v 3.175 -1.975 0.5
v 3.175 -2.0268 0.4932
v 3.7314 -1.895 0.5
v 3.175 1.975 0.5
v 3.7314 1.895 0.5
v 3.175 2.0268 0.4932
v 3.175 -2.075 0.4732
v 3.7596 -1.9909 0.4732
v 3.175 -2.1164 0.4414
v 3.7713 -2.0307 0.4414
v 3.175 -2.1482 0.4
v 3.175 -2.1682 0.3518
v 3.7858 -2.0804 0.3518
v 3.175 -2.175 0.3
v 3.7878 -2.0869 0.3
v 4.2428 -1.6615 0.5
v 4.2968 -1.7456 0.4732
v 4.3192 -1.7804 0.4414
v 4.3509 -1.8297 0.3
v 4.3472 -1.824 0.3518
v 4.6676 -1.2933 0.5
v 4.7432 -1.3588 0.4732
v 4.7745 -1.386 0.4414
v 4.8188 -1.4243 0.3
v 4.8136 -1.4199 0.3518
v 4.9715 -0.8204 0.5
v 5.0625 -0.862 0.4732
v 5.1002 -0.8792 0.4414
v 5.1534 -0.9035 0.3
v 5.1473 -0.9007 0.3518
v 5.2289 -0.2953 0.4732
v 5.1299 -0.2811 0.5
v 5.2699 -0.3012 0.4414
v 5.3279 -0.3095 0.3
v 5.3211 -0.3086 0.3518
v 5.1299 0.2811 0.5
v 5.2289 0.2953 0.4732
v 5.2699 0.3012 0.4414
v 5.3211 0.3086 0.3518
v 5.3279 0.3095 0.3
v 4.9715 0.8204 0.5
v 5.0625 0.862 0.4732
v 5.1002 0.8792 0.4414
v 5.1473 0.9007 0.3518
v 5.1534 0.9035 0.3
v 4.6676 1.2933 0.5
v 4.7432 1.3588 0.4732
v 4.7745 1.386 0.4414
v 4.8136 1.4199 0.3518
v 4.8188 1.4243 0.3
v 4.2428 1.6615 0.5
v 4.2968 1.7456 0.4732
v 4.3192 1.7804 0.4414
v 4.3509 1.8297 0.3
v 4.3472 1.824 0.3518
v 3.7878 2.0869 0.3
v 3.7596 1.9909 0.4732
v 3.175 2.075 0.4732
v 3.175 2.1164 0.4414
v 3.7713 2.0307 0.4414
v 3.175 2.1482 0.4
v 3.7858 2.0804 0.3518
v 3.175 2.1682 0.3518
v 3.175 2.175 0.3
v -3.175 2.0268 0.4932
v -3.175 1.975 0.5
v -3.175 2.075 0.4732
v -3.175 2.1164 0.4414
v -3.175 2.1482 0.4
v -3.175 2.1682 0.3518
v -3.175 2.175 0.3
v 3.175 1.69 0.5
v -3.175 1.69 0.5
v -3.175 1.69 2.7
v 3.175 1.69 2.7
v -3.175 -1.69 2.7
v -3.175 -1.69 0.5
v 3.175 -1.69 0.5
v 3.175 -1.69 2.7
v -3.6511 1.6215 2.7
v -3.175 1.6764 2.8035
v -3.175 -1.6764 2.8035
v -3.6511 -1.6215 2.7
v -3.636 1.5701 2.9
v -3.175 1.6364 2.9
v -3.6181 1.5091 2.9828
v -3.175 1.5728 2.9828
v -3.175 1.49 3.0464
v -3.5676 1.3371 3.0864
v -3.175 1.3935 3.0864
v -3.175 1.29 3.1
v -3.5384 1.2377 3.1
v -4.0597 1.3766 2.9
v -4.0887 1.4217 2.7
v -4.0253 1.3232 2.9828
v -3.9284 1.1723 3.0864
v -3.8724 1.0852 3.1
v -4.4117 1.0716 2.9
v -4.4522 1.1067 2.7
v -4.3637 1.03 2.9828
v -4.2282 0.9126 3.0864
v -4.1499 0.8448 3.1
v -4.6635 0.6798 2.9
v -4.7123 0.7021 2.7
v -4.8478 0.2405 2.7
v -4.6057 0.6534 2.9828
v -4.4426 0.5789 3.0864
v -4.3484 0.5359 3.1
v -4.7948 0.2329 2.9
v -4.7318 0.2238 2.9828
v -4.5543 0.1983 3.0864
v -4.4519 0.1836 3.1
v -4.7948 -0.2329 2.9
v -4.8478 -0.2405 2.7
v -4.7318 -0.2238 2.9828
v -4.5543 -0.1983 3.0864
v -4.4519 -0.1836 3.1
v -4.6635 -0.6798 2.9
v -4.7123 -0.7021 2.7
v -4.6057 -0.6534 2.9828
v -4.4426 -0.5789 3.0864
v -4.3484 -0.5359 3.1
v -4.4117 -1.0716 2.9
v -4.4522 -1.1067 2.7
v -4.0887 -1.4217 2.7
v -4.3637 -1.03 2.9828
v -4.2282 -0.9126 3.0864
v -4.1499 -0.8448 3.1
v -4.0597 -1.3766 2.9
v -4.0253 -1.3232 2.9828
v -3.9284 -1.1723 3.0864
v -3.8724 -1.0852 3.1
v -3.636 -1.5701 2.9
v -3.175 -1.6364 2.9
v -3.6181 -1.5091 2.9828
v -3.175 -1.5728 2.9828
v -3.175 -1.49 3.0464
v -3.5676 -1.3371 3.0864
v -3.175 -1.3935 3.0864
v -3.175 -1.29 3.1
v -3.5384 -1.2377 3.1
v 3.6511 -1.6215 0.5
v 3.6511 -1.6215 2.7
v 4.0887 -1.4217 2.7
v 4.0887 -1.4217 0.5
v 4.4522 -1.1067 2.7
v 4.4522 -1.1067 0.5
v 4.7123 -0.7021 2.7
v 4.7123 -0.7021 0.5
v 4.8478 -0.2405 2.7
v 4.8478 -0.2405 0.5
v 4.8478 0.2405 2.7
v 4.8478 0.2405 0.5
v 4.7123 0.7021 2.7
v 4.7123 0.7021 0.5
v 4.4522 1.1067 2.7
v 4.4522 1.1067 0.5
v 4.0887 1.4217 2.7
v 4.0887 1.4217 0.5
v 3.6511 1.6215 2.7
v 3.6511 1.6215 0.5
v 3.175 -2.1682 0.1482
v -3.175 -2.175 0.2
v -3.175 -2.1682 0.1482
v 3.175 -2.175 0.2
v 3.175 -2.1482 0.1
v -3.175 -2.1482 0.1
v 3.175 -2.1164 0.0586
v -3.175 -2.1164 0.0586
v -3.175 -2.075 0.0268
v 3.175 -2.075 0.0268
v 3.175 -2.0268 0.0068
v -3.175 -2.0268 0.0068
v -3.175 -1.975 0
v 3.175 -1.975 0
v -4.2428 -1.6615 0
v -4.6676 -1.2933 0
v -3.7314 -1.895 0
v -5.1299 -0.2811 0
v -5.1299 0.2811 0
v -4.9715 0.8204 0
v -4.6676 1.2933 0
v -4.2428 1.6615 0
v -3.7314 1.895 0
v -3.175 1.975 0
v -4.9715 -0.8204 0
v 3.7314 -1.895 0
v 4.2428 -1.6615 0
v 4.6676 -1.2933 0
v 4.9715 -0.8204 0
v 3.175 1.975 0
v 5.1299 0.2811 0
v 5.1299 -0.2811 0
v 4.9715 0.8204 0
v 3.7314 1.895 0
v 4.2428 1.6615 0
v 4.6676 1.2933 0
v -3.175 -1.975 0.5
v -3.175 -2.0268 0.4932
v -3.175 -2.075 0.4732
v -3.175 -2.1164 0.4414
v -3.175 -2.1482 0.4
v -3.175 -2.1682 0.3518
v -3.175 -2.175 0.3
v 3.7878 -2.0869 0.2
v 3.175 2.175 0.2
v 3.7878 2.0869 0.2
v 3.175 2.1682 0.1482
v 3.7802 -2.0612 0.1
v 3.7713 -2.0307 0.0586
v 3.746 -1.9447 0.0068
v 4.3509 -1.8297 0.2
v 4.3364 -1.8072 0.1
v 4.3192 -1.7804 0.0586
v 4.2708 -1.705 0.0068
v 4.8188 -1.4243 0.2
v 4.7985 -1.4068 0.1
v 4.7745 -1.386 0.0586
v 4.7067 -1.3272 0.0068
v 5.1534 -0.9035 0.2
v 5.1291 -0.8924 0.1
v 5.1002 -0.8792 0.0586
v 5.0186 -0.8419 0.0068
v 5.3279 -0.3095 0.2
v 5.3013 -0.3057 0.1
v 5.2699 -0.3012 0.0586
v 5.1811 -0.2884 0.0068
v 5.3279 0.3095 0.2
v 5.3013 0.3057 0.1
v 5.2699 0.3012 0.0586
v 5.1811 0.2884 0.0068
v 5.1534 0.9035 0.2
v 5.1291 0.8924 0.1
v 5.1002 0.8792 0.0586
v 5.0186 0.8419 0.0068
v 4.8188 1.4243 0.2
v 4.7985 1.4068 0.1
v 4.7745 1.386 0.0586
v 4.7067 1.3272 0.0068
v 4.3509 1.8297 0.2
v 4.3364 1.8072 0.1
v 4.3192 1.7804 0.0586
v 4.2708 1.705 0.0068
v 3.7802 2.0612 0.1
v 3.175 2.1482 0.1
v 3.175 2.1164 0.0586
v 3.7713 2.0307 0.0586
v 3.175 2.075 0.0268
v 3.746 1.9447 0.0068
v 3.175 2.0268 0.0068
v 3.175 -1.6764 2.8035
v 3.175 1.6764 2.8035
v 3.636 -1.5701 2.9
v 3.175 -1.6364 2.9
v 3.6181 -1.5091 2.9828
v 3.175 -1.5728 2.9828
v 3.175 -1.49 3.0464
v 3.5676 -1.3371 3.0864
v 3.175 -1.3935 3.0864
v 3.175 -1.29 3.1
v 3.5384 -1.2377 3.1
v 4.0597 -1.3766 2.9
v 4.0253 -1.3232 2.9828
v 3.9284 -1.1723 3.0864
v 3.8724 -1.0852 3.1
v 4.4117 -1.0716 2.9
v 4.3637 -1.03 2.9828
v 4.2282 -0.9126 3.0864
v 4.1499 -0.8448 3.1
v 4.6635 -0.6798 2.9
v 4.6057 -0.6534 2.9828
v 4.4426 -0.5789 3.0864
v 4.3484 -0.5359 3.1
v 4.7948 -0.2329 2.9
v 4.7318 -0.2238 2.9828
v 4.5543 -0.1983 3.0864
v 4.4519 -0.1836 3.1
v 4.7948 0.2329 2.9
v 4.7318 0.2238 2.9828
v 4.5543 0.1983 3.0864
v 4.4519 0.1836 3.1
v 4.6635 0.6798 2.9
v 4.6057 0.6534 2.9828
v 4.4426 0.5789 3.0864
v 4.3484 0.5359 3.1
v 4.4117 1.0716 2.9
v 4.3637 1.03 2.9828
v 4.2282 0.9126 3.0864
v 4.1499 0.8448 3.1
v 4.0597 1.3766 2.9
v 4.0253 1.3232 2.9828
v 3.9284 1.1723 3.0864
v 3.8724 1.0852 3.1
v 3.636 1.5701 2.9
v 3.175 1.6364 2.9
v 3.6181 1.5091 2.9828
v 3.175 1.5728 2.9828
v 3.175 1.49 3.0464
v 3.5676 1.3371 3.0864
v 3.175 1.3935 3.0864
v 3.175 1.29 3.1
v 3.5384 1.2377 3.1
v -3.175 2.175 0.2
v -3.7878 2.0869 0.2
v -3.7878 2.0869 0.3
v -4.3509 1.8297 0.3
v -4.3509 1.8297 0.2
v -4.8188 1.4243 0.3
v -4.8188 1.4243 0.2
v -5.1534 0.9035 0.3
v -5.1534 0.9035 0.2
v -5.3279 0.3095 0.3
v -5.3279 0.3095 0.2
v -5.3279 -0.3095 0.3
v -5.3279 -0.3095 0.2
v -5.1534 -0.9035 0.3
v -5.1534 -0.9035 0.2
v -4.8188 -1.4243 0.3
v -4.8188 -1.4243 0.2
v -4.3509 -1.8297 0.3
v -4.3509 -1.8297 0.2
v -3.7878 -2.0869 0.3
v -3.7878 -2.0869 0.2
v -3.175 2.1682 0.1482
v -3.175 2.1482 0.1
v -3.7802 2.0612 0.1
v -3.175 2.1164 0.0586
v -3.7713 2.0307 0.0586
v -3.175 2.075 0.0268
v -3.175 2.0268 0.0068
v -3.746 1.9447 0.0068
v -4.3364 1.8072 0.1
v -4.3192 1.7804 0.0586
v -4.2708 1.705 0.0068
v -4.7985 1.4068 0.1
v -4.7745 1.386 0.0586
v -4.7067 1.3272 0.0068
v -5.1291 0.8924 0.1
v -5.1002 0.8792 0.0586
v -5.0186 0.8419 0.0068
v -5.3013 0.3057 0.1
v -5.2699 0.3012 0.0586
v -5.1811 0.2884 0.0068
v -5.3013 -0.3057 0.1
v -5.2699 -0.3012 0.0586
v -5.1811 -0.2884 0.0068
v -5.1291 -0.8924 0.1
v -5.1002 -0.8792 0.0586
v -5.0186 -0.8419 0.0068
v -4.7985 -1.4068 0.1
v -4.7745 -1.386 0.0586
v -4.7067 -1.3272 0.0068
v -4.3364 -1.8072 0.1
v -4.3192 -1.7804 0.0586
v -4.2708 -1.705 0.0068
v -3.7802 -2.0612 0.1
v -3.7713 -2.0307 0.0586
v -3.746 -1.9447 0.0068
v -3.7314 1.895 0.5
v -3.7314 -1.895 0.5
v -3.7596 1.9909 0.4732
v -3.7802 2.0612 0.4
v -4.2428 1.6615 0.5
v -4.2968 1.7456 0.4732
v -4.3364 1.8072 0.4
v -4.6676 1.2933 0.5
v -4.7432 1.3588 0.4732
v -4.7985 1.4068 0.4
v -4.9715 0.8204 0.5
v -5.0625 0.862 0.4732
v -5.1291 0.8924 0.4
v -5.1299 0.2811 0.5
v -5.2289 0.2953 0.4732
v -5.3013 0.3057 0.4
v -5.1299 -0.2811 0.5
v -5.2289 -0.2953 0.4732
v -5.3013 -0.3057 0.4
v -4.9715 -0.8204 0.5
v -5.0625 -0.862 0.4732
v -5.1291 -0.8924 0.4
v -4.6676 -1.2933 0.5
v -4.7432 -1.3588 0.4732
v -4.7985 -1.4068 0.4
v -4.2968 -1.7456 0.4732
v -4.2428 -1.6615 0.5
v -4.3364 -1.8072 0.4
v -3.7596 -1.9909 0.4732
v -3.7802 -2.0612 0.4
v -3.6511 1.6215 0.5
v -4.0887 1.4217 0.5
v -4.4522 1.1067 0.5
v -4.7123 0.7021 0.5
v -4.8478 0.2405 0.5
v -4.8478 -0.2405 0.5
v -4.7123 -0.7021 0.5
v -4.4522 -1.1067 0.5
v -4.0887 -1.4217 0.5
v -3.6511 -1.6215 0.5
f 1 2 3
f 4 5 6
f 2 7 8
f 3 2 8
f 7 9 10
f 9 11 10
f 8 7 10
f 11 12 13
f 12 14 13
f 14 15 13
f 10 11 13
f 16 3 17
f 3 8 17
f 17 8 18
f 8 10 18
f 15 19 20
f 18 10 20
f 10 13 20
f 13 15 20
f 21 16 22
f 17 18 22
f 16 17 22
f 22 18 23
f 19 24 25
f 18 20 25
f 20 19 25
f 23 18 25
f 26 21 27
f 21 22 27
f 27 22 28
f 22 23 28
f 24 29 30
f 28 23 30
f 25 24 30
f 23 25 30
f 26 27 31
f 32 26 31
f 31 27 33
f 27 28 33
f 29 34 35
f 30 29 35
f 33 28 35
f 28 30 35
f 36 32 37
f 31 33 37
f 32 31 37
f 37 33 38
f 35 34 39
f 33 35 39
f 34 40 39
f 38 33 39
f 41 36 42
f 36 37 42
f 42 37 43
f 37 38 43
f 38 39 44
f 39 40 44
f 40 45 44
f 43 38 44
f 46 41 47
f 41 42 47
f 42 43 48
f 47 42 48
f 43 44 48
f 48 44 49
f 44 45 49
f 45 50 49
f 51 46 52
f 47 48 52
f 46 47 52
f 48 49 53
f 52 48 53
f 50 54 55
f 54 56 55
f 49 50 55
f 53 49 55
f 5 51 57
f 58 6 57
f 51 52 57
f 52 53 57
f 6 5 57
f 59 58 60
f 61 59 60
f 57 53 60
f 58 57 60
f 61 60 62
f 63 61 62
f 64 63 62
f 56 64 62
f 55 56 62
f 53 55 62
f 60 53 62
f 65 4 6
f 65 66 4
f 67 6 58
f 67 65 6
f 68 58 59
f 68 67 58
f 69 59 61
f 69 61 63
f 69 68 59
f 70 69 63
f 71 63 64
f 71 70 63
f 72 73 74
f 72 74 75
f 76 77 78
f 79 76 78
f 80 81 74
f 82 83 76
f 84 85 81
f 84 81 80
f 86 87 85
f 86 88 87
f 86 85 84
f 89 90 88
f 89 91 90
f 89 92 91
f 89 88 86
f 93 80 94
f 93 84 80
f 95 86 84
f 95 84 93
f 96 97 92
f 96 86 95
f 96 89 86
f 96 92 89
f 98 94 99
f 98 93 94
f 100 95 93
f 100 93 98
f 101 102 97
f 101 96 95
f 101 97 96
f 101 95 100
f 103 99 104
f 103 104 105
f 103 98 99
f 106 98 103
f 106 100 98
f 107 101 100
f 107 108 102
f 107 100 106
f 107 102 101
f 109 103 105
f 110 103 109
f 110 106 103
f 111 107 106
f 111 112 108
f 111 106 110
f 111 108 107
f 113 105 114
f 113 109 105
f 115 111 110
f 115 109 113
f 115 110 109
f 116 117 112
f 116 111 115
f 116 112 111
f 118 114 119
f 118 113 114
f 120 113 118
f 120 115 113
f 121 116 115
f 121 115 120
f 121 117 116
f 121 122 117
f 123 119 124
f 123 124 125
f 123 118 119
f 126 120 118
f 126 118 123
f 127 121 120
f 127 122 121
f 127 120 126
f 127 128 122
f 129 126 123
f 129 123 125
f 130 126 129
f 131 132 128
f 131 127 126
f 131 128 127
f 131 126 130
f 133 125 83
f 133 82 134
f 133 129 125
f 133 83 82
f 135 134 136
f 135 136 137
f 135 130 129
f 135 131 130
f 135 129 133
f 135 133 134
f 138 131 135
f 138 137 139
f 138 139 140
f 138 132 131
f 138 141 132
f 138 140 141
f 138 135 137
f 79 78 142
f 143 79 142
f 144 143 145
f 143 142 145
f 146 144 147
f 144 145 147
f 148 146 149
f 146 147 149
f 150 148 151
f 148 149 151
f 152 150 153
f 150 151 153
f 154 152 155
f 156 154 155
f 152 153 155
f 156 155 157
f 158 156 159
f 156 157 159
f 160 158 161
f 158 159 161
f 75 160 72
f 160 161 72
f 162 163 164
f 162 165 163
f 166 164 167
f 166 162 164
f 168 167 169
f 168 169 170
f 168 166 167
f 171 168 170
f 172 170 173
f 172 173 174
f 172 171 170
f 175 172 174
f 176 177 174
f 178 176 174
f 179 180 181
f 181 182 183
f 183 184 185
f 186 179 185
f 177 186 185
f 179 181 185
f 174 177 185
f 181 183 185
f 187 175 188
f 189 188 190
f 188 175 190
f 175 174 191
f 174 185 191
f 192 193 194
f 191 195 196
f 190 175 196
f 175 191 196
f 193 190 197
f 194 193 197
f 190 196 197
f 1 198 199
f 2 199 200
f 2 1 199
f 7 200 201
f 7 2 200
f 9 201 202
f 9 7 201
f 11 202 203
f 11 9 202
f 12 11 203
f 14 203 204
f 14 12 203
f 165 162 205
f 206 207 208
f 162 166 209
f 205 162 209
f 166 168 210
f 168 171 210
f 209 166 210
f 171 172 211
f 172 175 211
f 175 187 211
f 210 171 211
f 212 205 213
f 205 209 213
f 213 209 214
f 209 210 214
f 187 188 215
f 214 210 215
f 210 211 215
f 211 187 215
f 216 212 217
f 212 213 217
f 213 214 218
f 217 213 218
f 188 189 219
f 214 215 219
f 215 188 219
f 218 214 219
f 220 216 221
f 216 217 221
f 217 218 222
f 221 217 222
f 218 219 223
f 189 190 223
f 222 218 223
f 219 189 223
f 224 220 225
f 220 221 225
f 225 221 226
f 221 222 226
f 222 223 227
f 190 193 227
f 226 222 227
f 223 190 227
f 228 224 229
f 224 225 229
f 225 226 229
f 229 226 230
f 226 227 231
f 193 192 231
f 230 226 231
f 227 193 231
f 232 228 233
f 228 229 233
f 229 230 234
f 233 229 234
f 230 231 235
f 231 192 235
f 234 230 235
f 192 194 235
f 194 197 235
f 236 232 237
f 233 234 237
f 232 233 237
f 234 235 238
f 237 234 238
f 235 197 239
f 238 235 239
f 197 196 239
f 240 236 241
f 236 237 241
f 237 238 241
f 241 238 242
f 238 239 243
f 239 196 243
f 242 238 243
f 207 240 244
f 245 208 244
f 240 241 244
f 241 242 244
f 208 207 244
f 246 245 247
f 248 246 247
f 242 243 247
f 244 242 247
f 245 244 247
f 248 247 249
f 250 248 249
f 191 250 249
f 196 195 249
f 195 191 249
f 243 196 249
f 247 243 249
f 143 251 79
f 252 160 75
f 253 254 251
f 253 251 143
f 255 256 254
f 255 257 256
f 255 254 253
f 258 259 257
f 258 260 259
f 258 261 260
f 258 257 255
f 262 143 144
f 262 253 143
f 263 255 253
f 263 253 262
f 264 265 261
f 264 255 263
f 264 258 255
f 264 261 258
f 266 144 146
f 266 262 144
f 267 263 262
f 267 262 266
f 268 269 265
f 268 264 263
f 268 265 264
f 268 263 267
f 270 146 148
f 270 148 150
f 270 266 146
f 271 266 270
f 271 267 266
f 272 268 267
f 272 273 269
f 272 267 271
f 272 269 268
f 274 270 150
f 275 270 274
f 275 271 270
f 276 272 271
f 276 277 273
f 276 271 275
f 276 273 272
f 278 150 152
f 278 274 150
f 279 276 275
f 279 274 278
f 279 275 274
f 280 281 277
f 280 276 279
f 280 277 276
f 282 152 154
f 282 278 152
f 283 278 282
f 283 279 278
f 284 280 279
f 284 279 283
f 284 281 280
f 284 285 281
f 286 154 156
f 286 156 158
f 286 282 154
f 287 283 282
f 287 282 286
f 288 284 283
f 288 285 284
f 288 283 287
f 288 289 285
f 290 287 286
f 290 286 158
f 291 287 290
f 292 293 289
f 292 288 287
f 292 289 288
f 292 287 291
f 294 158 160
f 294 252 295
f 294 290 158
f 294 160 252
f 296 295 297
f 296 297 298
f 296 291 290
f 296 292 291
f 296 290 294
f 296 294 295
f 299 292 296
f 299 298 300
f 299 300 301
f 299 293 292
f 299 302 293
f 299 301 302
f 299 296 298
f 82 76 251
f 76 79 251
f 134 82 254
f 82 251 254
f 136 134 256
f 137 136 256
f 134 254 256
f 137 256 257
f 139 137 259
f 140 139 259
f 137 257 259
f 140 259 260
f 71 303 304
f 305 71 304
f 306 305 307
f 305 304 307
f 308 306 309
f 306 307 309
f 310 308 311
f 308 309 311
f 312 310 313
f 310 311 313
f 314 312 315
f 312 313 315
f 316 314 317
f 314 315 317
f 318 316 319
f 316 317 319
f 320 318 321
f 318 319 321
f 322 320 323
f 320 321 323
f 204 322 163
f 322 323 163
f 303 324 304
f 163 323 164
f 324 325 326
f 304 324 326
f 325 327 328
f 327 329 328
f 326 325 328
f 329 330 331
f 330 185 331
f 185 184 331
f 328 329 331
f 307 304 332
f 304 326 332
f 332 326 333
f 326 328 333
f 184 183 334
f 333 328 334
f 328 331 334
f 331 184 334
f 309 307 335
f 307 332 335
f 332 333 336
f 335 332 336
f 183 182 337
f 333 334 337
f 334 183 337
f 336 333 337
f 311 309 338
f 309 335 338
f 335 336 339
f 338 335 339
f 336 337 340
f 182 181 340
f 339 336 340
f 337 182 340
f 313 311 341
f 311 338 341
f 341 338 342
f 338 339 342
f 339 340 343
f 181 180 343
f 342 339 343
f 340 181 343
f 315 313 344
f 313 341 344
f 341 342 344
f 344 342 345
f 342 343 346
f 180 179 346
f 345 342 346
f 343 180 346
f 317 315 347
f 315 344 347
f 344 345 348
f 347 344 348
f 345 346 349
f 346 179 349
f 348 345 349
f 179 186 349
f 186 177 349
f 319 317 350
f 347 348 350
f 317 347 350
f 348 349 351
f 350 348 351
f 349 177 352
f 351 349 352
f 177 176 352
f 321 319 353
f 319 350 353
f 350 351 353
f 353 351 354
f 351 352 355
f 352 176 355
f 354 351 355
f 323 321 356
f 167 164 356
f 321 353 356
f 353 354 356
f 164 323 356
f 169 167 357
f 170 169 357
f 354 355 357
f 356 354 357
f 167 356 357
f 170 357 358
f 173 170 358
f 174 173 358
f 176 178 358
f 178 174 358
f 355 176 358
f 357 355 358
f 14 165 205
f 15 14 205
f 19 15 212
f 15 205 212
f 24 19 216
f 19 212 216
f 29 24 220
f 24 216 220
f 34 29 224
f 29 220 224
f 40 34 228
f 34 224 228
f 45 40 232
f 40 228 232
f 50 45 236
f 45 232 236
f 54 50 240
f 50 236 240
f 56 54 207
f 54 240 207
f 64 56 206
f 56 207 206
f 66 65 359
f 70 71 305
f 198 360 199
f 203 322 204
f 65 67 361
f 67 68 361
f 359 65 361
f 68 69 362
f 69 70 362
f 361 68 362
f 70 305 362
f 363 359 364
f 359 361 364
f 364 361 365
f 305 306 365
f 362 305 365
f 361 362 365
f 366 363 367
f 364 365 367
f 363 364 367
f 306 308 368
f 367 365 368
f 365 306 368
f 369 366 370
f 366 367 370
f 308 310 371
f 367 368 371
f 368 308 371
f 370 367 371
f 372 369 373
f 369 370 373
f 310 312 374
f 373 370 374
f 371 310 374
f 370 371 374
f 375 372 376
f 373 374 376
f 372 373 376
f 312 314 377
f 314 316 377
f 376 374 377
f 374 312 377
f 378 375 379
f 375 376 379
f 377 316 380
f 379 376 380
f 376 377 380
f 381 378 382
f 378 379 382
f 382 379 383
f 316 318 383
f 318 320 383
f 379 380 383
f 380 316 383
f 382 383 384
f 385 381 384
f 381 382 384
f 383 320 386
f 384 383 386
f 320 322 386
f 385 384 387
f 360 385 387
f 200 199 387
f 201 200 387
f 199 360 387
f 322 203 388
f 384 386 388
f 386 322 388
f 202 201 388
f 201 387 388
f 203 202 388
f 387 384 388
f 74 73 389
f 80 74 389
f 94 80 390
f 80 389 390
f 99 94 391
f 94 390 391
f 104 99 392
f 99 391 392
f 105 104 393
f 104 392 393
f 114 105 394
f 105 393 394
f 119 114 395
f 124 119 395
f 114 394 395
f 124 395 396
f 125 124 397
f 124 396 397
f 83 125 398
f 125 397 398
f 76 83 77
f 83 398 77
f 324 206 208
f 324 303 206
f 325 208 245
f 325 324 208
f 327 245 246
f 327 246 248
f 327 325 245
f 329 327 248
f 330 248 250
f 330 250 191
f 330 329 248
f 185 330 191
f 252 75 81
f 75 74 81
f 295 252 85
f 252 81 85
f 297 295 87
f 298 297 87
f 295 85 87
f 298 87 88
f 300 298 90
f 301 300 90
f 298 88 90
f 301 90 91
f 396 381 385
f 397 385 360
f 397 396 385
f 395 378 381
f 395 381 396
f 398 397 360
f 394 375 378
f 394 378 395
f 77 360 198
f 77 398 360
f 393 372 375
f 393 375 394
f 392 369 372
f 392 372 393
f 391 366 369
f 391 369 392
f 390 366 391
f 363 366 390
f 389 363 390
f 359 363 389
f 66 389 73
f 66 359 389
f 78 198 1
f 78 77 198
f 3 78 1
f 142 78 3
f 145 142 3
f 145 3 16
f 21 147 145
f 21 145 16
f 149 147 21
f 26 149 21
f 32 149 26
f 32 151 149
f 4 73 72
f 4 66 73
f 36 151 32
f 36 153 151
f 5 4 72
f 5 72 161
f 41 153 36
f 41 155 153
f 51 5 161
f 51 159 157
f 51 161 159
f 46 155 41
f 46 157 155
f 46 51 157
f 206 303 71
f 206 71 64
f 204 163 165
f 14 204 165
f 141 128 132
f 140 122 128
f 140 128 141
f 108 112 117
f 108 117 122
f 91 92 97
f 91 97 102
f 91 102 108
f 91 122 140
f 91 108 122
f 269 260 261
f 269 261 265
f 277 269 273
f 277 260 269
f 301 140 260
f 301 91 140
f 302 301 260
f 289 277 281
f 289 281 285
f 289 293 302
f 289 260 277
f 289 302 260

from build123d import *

# Parameters (mm, degrees)
PAD_DEPTH    = 0.5
PAD001_DEPTH = 2.6
FILLET_R     = 0.4
FILLET001_R  = 0.2


with BuildPart() as part:
    # Sketch → Pad (new body)
    with BuildSketch(Plane.XY):
        with BuildLine():
            ThreePointArc((-3.175, 2.175), (-5.35, 0), (-3.175, -2.175))
            Line((-3.175, -2.175), (3.175, -2.175))
            ThreePointArc((3.175, -2.175), (5.35, 0), (3.175, 2.175))
            Line((-3.175, 2.175), (3.175, 2.175))
        make_face()
    extrude(amount=PAD_DEPTH)

    # Sketch001 (on Face6 of Pad) → Pad001 (join)
    with BuildSketch(Plane.XY.offset(0.5)):
        with BuildLine():
            ThreePointArc((-3.175, 1.69), (-4.865, 0), (-3.175, -1.69))
            Line((-3.175, -1.69), (3.175, -1.69))
            ThreePointArc((3.175, -1.69), (4.865, 0), (3.175, 1.69))
            Line((-3.175, 1.69), (3.175, 1.69))
        make_face()
    extrude(amount=PAD001_DEPTH)

    # Fillet
    fillet_edges = [part.edges().sort_by_distance(p)[0] for p in [
        (0, -1.69, 3.1),
    ]]
    fillet(fillet_edges, radius=FILLET_R)

    # Fillet001
    fillet001_edges = [part.edges().sort_by_distance(p)[0] for p in [
        (-5.35, 0, 0.5),
        (-5.35, 0, 0),
    ]]
    fillet(fillet001_edges, radius=FILLET001_R)


solid = part.part
